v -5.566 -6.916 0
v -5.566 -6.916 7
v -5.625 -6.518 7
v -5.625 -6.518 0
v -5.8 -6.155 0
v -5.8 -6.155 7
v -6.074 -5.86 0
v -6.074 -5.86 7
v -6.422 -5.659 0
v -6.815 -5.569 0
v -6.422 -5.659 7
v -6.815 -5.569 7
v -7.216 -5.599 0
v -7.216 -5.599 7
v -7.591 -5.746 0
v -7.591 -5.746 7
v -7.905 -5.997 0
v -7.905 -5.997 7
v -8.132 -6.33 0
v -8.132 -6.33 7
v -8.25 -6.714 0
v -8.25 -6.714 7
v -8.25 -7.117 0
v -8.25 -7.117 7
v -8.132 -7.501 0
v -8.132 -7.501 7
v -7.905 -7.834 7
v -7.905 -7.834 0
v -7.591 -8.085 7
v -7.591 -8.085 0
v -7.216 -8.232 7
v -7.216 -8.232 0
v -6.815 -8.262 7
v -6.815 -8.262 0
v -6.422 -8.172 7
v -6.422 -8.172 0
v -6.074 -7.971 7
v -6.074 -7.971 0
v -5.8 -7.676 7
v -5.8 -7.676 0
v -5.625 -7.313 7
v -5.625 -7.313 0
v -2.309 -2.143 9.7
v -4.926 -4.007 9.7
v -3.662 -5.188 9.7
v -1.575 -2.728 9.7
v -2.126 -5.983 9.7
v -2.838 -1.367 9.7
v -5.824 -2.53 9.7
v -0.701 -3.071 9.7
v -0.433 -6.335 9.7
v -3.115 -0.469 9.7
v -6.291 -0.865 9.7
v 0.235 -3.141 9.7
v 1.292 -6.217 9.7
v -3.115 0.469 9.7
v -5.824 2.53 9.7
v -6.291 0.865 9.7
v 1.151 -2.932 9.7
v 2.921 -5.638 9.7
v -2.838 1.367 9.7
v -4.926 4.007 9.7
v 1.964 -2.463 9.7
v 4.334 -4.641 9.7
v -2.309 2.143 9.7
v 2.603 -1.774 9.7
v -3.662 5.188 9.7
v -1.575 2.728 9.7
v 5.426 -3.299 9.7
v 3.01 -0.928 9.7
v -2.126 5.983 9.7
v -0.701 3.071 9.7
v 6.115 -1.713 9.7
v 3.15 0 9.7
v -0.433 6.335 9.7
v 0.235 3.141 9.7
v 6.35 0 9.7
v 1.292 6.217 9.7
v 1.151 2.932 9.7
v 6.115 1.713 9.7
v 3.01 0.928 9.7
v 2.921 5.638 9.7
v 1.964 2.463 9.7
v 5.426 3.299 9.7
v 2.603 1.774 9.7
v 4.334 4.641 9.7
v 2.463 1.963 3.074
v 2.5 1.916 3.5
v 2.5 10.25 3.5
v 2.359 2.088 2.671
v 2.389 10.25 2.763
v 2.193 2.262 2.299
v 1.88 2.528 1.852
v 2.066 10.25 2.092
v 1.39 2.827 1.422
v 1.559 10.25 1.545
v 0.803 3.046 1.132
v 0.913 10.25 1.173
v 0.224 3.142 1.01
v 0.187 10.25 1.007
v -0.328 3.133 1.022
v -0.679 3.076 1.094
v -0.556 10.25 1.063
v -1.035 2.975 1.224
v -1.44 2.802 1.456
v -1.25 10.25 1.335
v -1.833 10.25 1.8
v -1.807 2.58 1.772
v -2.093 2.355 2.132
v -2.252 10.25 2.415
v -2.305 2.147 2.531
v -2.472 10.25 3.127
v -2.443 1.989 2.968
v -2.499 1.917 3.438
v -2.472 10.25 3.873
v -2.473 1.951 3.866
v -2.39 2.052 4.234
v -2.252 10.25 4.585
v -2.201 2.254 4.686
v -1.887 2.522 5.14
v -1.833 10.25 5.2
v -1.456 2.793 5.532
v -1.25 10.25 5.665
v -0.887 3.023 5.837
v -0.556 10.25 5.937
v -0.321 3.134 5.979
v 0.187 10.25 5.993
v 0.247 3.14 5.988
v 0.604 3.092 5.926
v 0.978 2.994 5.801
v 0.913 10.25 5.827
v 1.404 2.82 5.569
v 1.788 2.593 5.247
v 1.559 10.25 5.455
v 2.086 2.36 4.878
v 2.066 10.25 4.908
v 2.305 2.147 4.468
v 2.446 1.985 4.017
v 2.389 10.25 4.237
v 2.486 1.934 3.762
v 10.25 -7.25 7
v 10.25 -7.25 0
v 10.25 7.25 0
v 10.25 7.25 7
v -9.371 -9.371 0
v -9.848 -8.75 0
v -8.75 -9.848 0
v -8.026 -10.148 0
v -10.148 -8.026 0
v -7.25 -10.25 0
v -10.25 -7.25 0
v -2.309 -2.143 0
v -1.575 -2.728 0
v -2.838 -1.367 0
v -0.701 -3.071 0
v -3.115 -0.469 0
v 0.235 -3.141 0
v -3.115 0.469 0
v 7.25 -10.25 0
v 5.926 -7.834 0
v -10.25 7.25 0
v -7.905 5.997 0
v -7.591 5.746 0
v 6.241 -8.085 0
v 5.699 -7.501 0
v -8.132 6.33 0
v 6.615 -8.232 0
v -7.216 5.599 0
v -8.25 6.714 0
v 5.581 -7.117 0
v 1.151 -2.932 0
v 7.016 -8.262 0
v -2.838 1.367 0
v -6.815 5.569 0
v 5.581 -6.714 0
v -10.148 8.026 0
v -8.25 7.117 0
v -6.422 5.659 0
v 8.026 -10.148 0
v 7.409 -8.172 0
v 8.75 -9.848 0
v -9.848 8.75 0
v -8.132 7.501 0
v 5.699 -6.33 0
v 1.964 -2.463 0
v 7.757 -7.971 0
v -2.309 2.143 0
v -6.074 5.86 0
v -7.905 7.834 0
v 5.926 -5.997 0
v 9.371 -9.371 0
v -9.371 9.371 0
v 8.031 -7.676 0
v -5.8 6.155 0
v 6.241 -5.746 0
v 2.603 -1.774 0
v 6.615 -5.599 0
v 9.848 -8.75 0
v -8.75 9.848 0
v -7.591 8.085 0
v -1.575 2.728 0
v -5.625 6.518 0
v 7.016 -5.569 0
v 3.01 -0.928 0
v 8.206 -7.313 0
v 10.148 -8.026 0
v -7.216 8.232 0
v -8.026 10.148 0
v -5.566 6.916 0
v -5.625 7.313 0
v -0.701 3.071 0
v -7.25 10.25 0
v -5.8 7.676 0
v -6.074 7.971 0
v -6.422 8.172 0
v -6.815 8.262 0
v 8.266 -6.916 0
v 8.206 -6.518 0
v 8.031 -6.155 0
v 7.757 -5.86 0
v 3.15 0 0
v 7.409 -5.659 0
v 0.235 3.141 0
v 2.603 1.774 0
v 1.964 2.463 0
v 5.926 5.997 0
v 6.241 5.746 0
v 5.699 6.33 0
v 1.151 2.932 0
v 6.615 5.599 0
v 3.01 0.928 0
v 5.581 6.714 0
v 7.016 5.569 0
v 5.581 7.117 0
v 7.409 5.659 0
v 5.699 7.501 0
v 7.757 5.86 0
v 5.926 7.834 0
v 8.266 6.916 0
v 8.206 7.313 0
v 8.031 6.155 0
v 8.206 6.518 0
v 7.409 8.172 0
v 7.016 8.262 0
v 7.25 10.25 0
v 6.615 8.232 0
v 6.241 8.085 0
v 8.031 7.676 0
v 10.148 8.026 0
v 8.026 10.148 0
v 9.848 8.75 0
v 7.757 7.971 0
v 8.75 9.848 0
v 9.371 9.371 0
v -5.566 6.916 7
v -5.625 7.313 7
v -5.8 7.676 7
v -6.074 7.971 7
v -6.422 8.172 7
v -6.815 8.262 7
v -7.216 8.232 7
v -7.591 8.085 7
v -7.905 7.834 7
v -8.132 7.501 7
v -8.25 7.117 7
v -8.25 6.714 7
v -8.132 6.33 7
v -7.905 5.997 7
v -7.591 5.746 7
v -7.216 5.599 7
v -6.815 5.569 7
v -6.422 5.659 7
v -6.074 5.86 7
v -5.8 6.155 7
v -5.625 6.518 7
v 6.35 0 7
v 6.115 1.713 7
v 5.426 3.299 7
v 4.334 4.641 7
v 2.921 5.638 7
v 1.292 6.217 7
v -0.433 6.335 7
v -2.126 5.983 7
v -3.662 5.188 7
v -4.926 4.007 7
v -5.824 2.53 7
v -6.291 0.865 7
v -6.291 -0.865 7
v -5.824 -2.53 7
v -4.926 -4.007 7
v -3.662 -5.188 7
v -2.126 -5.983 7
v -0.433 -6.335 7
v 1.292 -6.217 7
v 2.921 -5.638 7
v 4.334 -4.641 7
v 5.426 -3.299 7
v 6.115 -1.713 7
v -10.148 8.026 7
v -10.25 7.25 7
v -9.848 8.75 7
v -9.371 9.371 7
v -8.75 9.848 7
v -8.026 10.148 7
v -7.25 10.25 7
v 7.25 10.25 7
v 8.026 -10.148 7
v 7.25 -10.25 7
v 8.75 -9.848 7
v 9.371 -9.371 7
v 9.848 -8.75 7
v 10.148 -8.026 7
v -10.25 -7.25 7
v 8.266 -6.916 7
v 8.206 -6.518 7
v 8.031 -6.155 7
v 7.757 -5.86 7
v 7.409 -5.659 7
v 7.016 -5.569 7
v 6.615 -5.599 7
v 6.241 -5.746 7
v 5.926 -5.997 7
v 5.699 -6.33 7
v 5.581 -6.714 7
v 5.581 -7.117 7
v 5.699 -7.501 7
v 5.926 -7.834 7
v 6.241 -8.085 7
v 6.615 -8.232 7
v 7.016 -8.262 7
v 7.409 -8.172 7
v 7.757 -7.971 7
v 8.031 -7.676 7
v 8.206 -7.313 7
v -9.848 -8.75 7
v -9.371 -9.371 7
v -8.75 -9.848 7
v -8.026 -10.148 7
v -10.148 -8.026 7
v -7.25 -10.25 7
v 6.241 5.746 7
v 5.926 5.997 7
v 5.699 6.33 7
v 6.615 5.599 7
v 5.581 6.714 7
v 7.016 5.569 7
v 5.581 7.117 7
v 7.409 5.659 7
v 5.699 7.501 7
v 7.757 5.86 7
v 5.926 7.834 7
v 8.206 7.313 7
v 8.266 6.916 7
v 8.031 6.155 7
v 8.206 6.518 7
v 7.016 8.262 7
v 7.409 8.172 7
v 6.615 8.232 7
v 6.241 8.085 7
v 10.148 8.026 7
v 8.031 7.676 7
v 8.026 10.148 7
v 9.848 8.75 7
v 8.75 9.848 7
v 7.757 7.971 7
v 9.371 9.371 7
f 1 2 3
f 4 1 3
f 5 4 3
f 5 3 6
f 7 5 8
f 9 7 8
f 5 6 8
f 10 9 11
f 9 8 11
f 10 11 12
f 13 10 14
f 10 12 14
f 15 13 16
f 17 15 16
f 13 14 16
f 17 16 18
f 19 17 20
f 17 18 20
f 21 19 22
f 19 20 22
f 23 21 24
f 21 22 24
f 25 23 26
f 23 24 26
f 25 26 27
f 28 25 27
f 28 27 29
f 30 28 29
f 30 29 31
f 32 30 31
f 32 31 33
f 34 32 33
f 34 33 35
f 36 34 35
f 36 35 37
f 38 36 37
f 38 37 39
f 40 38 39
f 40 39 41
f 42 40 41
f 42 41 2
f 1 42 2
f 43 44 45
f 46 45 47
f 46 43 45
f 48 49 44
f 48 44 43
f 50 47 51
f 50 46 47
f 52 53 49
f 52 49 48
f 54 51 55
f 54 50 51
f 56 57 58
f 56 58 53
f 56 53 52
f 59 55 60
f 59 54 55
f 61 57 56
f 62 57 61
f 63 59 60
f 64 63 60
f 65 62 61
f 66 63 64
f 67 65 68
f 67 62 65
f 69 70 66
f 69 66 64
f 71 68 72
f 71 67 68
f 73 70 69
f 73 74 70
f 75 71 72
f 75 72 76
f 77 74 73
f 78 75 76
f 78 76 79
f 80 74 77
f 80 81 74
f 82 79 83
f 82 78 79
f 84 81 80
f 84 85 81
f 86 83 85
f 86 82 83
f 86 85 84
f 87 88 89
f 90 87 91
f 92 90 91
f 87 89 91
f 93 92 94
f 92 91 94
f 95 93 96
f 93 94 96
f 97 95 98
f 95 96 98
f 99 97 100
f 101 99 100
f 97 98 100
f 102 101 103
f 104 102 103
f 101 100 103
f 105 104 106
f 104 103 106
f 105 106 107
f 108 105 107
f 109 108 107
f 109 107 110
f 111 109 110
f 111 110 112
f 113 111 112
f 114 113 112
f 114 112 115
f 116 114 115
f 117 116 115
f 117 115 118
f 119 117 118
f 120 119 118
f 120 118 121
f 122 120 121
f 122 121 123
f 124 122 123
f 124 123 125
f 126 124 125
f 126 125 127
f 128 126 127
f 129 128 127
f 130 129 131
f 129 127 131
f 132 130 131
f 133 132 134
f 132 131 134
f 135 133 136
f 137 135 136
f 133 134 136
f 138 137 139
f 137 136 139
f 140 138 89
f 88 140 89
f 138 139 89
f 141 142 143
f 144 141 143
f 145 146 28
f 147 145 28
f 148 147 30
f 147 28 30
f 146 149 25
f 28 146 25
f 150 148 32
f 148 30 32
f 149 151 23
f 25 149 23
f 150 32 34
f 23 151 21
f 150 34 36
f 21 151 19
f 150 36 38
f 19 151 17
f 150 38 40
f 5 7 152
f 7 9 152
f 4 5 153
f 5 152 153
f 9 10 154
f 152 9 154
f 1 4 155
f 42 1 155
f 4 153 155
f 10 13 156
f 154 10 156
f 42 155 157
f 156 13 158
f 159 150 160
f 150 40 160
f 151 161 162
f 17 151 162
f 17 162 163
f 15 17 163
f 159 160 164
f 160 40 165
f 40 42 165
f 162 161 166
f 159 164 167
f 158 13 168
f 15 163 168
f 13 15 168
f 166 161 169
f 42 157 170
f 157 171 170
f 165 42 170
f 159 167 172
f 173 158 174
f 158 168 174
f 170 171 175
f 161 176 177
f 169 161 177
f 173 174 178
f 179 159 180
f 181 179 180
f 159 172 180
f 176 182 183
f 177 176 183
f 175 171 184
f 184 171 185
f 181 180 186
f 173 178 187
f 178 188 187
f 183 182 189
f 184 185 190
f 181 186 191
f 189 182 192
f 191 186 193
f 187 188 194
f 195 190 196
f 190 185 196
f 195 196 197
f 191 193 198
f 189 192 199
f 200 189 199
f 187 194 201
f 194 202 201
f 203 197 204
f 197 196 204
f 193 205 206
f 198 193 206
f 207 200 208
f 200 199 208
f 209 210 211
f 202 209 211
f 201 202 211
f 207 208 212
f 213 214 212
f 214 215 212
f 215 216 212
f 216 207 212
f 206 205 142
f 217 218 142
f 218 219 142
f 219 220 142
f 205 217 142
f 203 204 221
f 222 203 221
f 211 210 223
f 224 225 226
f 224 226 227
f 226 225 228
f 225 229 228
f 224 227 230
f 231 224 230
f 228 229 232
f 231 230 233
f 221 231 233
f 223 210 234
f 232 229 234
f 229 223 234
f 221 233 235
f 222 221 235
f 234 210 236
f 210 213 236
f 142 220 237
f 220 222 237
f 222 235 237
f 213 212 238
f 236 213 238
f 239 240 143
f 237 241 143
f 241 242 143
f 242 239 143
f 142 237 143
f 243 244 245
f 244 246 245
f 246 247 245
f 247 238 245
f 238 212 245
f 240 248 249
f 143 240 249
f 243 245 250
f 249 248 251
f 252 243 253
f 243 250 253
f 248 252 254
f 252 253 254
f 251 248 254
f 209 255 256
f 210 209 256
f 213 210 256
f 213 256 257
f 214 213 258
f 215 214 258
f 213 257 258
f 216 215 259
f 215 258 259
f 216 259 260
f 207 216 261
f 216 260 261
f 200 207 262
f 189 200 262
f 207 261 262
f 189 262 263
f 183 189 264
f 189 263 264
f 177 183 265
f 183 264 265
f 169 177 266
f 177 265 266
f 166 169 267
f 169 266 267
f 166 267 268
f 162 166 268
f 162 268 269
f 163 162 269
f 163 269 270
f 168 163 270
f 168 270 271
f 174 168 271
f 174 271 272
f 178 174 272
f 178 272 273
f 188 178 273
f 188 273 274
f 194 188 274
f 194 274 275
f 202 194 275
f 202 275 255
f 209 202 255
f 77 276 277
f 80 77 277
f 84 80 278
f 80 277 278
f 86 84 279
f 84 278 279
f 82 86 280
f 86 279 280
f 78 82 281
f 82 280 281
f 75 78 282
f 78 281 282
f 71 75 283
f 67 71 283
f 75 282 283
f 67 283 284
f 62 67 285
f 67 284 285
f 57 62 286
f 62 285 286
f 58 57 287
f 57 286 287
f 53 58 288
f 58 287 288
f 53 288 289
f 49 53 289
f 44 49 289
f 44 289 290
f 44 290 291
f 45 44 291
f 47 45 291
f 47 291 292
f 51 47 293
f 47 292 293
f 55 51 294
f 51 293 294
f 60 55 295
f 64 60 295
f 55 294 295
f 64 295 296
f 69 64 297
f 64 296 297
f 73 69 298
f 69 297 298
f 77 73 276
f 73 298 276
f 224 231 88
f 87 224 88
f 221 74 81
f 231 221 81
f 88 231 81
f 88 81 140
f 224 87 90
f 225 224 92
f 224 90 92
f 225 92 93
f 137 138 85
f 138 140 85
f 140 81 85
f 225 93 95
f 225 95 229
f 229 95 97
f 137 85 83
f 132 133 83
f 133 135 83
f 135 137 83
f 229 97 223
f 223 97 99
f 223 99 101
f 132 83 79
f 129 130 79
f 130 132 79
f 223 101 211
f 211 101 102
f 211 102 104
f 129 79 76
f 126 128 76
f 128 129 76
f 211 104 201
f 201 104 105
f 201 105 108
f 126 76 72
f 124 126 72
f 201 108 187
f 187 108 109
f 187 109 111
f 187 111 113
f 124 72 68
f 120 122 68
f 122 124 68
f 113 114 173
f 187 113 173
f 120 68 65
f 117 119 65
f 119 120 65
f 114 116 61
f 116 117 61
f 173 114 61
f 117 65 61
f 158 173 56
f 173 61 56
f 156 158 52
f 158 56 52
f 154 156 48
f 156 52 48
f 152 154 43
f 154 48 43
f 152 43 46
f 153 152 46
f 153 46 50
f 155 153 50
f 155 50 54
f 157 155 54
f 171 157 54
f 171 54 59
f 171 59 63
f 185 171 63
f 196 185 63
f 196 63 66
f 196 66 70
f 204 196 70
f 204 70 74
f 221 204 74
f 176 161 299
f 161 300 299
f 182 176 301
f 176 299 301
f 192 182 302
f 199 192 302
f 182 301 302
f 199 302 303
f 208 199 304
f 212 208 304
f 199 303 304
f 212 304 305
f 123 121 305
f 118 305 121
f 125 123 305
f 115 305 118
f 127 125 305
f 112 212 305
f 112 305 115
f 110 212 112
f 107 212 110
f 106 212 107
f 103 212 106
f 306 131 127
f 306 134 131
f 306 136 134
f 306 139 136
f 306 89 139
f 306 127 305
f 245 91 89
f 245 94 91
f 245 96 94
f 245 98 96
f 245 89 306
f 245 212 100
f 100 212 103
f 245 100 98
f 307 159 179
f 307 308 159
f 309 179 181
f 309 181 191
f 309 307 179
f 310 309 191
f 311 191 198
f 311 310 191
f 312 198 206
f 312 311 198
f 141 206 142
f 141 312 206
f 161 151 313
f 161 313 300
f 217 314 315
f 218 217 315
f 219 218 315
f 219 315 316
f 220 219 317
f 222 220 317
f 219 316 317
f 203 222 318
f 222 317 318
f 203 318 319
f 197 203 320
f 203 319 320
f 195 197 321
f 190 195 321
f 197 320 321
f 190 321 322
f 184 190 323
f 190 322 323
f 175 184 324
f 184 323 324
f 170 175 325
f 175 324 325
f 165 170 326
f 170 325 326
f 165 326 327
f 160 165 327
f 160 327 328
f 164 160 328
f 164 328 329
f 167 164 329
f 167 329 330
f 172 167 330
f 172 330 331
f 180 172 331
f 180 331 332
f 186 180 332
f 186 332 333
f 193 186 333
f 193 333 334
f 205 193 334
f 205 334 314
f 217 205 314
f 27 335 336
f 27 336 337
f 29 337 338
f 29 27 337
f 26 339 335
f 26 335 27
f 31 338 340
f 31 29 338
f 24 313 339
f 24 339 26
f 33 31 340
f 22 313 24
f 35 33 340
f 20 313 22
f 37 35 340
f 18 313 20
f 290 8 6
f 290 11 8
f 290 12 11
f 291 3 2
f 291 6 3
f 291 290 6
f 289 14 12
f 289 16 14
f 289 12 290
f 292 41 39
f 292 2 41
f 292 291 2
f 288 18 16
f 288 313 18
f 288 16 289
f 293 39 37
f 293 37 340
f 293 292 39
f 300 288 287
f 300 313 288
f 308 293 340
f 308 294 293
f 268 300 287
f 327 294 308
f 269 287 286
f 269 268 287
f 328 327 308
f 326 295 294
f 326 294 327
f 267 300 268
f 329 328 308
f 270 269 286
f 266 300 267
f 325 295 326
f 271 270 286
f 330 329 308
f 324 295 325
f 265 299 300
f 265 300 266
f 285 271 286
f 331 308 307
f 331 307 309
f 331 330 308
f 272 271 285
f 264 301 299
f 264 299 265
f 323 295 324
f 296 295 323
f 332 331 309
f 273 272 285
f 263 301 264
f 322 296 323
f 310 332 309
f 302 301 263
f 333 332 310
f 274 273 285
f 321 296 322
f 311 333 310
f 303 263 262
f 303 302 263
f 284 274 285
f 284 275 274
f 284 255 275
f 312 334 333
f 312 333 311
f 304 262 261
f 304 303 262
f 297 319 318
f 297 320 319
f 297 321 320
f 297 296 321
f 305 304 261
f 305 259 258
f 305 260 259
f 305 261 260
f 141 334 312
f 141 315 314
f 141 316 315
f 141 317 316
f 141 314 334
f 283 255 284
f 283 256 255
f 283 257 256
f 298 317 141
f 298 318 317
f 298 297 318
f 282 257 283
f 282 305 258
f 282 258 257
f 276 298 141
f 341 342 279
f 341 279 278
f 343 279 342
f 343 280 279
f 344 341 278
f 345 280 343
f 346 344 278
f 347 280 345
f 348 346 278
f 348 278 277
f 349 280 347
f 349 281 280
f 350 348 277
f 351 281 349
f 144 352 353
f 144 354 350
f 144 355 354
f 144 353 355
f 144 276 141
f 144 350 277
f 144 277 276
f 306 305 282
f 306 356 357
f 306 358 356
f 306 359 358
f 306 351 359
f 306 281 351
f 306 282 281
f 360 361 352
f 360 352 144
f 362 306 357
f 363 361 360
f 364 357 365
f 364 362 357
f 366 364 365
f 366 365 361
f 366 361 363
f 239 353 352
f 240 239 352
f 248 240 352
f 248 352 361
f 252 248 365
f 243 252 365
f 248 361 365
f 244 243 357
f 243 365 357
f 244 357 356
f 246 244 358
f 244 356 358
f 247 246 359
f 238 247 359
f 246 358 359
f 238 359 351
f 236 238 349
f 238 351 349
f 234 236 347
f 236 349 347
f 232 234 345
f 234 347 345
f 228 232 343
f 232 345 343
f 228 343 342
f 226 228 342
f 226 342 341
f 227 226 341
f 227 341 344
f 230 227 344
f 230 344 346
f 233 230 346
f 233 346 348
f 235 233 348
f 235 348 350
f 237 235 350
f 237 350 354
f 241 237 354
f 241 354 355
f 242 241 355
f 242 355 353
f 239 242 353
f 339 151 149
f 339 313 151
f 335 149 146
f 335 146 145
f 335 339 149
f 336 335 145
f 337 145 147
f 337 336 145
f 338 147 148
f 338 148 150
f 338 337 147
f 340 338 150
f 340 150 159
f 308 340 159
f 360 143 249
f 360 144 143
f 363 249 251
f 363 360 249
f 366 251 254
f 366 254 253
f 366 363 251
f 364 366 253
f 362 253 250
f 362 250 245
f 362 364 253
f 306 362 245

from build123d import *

# Parameters (mm, degrees)
CROQUIS1_W              = 20.5
CROQUIS1_H              = 20.5
SALIENTE_EXTRUIR1_DEPTH = 7
REDONDEO1_R             = 3
CROQUIS2_R              = 6.35
SALIENTE_EXTRUIR2_DEPTH = 2.7
CROQUIS3_R              = 3.15
CORTAR_EXTRUIR1_DEPTH   = 10.7
CROQUIS4_R              = 1.35
CORTAR_EXTRUIR2_DEPTH   = 8
CORTAR_EXTRUIR3_REACH   = 22.5
CROQUIS5_R              = 2.5


with BuildPart() as part:
    # Croquis1 → Saliente-Extruir1 (new body)
    with BuildSketch(Plane.XY):
        Rectangle(CROQUIS1_W, CROQUIS1_H)
    extrude(amount=SALIENTE_EXTRUIR1_DEPTH)

    # Redondeo1
    redondeo1_edges = [part.edges().sort_by_distance(p)[0] for p in [
        (10.25, -10.25, 3.5),
        (-10.25, -10.25, 3.5),
        (-10.25, 10.25, 3.5),
        (10.25, 10.25, 3.5),
    ]]
    fillet(redondeo1_edges, radius=REDONDEO1_R)

    # Croquis2 → Saliente-Extruir2 (add)
    with BuildSketch(Plane.XY.offset(7)):
        Circle(CROQUIS2_R)
    extrude(amount=SALIENTE_EXTRUIR2_DEPTH)

    # Croquis3 → Cortar-Extruir1 (cut, through all)
    with BuildSketch(Plane.XY.offset(9.7)):
        Circle(CROQUIS3_R)
    extrude(amount=-CORTAR_EXTRUIR1_DEPTH, mode=Mode.SUBTRACT)

    # Croquis4 → Cortar-Extruir2 (cut, through all)
    with BuildSketch(Plane.XY.offset(7)):
        with Locations((-6.91550432, 6.91550432)):
            Circle(CROQUIS4_R)
        with Locations((6.91550432, 6.91550432)):
            Circle(CROQUIS4_R)
        with Locations((6.91550432, -6.91550432)):
            Circle(CROQUIS4_R)
        with Locations((-6.91550432, -6.91550432)):
            Circle(CROQUIS4_R)
    extrude(amount=-CORTAR_EXTRUIR2_DEPTH, mode=Mode.SUBTRACT)

    # Croquis5 → Cortar-Extruir3 (cut, up to next)
    with BuildSketch(Plane(origin=(0, 10.25, 0), x_dir=(1, 0, 0), z_dir=(0, 1, 0)), mode=Mode.PRIVATE) as cortar_extruir3_sk1:
        with Locations((0, -3.5)):
            Circle(CROQUIS5_R)
    cortar_extruir3_tool1 = extrude(cortar_extruir3_sk1.sketch, amount=-CORTAR_EXTRUIR3_REACH, mode=Mode.PRIVATE) & part.part
    add(cortar_extruir3_tool1.solids().sort_by_distance((0, 10.25, 3.5))[0], mode=Mode.SUBTRACT)


solid = part.part
